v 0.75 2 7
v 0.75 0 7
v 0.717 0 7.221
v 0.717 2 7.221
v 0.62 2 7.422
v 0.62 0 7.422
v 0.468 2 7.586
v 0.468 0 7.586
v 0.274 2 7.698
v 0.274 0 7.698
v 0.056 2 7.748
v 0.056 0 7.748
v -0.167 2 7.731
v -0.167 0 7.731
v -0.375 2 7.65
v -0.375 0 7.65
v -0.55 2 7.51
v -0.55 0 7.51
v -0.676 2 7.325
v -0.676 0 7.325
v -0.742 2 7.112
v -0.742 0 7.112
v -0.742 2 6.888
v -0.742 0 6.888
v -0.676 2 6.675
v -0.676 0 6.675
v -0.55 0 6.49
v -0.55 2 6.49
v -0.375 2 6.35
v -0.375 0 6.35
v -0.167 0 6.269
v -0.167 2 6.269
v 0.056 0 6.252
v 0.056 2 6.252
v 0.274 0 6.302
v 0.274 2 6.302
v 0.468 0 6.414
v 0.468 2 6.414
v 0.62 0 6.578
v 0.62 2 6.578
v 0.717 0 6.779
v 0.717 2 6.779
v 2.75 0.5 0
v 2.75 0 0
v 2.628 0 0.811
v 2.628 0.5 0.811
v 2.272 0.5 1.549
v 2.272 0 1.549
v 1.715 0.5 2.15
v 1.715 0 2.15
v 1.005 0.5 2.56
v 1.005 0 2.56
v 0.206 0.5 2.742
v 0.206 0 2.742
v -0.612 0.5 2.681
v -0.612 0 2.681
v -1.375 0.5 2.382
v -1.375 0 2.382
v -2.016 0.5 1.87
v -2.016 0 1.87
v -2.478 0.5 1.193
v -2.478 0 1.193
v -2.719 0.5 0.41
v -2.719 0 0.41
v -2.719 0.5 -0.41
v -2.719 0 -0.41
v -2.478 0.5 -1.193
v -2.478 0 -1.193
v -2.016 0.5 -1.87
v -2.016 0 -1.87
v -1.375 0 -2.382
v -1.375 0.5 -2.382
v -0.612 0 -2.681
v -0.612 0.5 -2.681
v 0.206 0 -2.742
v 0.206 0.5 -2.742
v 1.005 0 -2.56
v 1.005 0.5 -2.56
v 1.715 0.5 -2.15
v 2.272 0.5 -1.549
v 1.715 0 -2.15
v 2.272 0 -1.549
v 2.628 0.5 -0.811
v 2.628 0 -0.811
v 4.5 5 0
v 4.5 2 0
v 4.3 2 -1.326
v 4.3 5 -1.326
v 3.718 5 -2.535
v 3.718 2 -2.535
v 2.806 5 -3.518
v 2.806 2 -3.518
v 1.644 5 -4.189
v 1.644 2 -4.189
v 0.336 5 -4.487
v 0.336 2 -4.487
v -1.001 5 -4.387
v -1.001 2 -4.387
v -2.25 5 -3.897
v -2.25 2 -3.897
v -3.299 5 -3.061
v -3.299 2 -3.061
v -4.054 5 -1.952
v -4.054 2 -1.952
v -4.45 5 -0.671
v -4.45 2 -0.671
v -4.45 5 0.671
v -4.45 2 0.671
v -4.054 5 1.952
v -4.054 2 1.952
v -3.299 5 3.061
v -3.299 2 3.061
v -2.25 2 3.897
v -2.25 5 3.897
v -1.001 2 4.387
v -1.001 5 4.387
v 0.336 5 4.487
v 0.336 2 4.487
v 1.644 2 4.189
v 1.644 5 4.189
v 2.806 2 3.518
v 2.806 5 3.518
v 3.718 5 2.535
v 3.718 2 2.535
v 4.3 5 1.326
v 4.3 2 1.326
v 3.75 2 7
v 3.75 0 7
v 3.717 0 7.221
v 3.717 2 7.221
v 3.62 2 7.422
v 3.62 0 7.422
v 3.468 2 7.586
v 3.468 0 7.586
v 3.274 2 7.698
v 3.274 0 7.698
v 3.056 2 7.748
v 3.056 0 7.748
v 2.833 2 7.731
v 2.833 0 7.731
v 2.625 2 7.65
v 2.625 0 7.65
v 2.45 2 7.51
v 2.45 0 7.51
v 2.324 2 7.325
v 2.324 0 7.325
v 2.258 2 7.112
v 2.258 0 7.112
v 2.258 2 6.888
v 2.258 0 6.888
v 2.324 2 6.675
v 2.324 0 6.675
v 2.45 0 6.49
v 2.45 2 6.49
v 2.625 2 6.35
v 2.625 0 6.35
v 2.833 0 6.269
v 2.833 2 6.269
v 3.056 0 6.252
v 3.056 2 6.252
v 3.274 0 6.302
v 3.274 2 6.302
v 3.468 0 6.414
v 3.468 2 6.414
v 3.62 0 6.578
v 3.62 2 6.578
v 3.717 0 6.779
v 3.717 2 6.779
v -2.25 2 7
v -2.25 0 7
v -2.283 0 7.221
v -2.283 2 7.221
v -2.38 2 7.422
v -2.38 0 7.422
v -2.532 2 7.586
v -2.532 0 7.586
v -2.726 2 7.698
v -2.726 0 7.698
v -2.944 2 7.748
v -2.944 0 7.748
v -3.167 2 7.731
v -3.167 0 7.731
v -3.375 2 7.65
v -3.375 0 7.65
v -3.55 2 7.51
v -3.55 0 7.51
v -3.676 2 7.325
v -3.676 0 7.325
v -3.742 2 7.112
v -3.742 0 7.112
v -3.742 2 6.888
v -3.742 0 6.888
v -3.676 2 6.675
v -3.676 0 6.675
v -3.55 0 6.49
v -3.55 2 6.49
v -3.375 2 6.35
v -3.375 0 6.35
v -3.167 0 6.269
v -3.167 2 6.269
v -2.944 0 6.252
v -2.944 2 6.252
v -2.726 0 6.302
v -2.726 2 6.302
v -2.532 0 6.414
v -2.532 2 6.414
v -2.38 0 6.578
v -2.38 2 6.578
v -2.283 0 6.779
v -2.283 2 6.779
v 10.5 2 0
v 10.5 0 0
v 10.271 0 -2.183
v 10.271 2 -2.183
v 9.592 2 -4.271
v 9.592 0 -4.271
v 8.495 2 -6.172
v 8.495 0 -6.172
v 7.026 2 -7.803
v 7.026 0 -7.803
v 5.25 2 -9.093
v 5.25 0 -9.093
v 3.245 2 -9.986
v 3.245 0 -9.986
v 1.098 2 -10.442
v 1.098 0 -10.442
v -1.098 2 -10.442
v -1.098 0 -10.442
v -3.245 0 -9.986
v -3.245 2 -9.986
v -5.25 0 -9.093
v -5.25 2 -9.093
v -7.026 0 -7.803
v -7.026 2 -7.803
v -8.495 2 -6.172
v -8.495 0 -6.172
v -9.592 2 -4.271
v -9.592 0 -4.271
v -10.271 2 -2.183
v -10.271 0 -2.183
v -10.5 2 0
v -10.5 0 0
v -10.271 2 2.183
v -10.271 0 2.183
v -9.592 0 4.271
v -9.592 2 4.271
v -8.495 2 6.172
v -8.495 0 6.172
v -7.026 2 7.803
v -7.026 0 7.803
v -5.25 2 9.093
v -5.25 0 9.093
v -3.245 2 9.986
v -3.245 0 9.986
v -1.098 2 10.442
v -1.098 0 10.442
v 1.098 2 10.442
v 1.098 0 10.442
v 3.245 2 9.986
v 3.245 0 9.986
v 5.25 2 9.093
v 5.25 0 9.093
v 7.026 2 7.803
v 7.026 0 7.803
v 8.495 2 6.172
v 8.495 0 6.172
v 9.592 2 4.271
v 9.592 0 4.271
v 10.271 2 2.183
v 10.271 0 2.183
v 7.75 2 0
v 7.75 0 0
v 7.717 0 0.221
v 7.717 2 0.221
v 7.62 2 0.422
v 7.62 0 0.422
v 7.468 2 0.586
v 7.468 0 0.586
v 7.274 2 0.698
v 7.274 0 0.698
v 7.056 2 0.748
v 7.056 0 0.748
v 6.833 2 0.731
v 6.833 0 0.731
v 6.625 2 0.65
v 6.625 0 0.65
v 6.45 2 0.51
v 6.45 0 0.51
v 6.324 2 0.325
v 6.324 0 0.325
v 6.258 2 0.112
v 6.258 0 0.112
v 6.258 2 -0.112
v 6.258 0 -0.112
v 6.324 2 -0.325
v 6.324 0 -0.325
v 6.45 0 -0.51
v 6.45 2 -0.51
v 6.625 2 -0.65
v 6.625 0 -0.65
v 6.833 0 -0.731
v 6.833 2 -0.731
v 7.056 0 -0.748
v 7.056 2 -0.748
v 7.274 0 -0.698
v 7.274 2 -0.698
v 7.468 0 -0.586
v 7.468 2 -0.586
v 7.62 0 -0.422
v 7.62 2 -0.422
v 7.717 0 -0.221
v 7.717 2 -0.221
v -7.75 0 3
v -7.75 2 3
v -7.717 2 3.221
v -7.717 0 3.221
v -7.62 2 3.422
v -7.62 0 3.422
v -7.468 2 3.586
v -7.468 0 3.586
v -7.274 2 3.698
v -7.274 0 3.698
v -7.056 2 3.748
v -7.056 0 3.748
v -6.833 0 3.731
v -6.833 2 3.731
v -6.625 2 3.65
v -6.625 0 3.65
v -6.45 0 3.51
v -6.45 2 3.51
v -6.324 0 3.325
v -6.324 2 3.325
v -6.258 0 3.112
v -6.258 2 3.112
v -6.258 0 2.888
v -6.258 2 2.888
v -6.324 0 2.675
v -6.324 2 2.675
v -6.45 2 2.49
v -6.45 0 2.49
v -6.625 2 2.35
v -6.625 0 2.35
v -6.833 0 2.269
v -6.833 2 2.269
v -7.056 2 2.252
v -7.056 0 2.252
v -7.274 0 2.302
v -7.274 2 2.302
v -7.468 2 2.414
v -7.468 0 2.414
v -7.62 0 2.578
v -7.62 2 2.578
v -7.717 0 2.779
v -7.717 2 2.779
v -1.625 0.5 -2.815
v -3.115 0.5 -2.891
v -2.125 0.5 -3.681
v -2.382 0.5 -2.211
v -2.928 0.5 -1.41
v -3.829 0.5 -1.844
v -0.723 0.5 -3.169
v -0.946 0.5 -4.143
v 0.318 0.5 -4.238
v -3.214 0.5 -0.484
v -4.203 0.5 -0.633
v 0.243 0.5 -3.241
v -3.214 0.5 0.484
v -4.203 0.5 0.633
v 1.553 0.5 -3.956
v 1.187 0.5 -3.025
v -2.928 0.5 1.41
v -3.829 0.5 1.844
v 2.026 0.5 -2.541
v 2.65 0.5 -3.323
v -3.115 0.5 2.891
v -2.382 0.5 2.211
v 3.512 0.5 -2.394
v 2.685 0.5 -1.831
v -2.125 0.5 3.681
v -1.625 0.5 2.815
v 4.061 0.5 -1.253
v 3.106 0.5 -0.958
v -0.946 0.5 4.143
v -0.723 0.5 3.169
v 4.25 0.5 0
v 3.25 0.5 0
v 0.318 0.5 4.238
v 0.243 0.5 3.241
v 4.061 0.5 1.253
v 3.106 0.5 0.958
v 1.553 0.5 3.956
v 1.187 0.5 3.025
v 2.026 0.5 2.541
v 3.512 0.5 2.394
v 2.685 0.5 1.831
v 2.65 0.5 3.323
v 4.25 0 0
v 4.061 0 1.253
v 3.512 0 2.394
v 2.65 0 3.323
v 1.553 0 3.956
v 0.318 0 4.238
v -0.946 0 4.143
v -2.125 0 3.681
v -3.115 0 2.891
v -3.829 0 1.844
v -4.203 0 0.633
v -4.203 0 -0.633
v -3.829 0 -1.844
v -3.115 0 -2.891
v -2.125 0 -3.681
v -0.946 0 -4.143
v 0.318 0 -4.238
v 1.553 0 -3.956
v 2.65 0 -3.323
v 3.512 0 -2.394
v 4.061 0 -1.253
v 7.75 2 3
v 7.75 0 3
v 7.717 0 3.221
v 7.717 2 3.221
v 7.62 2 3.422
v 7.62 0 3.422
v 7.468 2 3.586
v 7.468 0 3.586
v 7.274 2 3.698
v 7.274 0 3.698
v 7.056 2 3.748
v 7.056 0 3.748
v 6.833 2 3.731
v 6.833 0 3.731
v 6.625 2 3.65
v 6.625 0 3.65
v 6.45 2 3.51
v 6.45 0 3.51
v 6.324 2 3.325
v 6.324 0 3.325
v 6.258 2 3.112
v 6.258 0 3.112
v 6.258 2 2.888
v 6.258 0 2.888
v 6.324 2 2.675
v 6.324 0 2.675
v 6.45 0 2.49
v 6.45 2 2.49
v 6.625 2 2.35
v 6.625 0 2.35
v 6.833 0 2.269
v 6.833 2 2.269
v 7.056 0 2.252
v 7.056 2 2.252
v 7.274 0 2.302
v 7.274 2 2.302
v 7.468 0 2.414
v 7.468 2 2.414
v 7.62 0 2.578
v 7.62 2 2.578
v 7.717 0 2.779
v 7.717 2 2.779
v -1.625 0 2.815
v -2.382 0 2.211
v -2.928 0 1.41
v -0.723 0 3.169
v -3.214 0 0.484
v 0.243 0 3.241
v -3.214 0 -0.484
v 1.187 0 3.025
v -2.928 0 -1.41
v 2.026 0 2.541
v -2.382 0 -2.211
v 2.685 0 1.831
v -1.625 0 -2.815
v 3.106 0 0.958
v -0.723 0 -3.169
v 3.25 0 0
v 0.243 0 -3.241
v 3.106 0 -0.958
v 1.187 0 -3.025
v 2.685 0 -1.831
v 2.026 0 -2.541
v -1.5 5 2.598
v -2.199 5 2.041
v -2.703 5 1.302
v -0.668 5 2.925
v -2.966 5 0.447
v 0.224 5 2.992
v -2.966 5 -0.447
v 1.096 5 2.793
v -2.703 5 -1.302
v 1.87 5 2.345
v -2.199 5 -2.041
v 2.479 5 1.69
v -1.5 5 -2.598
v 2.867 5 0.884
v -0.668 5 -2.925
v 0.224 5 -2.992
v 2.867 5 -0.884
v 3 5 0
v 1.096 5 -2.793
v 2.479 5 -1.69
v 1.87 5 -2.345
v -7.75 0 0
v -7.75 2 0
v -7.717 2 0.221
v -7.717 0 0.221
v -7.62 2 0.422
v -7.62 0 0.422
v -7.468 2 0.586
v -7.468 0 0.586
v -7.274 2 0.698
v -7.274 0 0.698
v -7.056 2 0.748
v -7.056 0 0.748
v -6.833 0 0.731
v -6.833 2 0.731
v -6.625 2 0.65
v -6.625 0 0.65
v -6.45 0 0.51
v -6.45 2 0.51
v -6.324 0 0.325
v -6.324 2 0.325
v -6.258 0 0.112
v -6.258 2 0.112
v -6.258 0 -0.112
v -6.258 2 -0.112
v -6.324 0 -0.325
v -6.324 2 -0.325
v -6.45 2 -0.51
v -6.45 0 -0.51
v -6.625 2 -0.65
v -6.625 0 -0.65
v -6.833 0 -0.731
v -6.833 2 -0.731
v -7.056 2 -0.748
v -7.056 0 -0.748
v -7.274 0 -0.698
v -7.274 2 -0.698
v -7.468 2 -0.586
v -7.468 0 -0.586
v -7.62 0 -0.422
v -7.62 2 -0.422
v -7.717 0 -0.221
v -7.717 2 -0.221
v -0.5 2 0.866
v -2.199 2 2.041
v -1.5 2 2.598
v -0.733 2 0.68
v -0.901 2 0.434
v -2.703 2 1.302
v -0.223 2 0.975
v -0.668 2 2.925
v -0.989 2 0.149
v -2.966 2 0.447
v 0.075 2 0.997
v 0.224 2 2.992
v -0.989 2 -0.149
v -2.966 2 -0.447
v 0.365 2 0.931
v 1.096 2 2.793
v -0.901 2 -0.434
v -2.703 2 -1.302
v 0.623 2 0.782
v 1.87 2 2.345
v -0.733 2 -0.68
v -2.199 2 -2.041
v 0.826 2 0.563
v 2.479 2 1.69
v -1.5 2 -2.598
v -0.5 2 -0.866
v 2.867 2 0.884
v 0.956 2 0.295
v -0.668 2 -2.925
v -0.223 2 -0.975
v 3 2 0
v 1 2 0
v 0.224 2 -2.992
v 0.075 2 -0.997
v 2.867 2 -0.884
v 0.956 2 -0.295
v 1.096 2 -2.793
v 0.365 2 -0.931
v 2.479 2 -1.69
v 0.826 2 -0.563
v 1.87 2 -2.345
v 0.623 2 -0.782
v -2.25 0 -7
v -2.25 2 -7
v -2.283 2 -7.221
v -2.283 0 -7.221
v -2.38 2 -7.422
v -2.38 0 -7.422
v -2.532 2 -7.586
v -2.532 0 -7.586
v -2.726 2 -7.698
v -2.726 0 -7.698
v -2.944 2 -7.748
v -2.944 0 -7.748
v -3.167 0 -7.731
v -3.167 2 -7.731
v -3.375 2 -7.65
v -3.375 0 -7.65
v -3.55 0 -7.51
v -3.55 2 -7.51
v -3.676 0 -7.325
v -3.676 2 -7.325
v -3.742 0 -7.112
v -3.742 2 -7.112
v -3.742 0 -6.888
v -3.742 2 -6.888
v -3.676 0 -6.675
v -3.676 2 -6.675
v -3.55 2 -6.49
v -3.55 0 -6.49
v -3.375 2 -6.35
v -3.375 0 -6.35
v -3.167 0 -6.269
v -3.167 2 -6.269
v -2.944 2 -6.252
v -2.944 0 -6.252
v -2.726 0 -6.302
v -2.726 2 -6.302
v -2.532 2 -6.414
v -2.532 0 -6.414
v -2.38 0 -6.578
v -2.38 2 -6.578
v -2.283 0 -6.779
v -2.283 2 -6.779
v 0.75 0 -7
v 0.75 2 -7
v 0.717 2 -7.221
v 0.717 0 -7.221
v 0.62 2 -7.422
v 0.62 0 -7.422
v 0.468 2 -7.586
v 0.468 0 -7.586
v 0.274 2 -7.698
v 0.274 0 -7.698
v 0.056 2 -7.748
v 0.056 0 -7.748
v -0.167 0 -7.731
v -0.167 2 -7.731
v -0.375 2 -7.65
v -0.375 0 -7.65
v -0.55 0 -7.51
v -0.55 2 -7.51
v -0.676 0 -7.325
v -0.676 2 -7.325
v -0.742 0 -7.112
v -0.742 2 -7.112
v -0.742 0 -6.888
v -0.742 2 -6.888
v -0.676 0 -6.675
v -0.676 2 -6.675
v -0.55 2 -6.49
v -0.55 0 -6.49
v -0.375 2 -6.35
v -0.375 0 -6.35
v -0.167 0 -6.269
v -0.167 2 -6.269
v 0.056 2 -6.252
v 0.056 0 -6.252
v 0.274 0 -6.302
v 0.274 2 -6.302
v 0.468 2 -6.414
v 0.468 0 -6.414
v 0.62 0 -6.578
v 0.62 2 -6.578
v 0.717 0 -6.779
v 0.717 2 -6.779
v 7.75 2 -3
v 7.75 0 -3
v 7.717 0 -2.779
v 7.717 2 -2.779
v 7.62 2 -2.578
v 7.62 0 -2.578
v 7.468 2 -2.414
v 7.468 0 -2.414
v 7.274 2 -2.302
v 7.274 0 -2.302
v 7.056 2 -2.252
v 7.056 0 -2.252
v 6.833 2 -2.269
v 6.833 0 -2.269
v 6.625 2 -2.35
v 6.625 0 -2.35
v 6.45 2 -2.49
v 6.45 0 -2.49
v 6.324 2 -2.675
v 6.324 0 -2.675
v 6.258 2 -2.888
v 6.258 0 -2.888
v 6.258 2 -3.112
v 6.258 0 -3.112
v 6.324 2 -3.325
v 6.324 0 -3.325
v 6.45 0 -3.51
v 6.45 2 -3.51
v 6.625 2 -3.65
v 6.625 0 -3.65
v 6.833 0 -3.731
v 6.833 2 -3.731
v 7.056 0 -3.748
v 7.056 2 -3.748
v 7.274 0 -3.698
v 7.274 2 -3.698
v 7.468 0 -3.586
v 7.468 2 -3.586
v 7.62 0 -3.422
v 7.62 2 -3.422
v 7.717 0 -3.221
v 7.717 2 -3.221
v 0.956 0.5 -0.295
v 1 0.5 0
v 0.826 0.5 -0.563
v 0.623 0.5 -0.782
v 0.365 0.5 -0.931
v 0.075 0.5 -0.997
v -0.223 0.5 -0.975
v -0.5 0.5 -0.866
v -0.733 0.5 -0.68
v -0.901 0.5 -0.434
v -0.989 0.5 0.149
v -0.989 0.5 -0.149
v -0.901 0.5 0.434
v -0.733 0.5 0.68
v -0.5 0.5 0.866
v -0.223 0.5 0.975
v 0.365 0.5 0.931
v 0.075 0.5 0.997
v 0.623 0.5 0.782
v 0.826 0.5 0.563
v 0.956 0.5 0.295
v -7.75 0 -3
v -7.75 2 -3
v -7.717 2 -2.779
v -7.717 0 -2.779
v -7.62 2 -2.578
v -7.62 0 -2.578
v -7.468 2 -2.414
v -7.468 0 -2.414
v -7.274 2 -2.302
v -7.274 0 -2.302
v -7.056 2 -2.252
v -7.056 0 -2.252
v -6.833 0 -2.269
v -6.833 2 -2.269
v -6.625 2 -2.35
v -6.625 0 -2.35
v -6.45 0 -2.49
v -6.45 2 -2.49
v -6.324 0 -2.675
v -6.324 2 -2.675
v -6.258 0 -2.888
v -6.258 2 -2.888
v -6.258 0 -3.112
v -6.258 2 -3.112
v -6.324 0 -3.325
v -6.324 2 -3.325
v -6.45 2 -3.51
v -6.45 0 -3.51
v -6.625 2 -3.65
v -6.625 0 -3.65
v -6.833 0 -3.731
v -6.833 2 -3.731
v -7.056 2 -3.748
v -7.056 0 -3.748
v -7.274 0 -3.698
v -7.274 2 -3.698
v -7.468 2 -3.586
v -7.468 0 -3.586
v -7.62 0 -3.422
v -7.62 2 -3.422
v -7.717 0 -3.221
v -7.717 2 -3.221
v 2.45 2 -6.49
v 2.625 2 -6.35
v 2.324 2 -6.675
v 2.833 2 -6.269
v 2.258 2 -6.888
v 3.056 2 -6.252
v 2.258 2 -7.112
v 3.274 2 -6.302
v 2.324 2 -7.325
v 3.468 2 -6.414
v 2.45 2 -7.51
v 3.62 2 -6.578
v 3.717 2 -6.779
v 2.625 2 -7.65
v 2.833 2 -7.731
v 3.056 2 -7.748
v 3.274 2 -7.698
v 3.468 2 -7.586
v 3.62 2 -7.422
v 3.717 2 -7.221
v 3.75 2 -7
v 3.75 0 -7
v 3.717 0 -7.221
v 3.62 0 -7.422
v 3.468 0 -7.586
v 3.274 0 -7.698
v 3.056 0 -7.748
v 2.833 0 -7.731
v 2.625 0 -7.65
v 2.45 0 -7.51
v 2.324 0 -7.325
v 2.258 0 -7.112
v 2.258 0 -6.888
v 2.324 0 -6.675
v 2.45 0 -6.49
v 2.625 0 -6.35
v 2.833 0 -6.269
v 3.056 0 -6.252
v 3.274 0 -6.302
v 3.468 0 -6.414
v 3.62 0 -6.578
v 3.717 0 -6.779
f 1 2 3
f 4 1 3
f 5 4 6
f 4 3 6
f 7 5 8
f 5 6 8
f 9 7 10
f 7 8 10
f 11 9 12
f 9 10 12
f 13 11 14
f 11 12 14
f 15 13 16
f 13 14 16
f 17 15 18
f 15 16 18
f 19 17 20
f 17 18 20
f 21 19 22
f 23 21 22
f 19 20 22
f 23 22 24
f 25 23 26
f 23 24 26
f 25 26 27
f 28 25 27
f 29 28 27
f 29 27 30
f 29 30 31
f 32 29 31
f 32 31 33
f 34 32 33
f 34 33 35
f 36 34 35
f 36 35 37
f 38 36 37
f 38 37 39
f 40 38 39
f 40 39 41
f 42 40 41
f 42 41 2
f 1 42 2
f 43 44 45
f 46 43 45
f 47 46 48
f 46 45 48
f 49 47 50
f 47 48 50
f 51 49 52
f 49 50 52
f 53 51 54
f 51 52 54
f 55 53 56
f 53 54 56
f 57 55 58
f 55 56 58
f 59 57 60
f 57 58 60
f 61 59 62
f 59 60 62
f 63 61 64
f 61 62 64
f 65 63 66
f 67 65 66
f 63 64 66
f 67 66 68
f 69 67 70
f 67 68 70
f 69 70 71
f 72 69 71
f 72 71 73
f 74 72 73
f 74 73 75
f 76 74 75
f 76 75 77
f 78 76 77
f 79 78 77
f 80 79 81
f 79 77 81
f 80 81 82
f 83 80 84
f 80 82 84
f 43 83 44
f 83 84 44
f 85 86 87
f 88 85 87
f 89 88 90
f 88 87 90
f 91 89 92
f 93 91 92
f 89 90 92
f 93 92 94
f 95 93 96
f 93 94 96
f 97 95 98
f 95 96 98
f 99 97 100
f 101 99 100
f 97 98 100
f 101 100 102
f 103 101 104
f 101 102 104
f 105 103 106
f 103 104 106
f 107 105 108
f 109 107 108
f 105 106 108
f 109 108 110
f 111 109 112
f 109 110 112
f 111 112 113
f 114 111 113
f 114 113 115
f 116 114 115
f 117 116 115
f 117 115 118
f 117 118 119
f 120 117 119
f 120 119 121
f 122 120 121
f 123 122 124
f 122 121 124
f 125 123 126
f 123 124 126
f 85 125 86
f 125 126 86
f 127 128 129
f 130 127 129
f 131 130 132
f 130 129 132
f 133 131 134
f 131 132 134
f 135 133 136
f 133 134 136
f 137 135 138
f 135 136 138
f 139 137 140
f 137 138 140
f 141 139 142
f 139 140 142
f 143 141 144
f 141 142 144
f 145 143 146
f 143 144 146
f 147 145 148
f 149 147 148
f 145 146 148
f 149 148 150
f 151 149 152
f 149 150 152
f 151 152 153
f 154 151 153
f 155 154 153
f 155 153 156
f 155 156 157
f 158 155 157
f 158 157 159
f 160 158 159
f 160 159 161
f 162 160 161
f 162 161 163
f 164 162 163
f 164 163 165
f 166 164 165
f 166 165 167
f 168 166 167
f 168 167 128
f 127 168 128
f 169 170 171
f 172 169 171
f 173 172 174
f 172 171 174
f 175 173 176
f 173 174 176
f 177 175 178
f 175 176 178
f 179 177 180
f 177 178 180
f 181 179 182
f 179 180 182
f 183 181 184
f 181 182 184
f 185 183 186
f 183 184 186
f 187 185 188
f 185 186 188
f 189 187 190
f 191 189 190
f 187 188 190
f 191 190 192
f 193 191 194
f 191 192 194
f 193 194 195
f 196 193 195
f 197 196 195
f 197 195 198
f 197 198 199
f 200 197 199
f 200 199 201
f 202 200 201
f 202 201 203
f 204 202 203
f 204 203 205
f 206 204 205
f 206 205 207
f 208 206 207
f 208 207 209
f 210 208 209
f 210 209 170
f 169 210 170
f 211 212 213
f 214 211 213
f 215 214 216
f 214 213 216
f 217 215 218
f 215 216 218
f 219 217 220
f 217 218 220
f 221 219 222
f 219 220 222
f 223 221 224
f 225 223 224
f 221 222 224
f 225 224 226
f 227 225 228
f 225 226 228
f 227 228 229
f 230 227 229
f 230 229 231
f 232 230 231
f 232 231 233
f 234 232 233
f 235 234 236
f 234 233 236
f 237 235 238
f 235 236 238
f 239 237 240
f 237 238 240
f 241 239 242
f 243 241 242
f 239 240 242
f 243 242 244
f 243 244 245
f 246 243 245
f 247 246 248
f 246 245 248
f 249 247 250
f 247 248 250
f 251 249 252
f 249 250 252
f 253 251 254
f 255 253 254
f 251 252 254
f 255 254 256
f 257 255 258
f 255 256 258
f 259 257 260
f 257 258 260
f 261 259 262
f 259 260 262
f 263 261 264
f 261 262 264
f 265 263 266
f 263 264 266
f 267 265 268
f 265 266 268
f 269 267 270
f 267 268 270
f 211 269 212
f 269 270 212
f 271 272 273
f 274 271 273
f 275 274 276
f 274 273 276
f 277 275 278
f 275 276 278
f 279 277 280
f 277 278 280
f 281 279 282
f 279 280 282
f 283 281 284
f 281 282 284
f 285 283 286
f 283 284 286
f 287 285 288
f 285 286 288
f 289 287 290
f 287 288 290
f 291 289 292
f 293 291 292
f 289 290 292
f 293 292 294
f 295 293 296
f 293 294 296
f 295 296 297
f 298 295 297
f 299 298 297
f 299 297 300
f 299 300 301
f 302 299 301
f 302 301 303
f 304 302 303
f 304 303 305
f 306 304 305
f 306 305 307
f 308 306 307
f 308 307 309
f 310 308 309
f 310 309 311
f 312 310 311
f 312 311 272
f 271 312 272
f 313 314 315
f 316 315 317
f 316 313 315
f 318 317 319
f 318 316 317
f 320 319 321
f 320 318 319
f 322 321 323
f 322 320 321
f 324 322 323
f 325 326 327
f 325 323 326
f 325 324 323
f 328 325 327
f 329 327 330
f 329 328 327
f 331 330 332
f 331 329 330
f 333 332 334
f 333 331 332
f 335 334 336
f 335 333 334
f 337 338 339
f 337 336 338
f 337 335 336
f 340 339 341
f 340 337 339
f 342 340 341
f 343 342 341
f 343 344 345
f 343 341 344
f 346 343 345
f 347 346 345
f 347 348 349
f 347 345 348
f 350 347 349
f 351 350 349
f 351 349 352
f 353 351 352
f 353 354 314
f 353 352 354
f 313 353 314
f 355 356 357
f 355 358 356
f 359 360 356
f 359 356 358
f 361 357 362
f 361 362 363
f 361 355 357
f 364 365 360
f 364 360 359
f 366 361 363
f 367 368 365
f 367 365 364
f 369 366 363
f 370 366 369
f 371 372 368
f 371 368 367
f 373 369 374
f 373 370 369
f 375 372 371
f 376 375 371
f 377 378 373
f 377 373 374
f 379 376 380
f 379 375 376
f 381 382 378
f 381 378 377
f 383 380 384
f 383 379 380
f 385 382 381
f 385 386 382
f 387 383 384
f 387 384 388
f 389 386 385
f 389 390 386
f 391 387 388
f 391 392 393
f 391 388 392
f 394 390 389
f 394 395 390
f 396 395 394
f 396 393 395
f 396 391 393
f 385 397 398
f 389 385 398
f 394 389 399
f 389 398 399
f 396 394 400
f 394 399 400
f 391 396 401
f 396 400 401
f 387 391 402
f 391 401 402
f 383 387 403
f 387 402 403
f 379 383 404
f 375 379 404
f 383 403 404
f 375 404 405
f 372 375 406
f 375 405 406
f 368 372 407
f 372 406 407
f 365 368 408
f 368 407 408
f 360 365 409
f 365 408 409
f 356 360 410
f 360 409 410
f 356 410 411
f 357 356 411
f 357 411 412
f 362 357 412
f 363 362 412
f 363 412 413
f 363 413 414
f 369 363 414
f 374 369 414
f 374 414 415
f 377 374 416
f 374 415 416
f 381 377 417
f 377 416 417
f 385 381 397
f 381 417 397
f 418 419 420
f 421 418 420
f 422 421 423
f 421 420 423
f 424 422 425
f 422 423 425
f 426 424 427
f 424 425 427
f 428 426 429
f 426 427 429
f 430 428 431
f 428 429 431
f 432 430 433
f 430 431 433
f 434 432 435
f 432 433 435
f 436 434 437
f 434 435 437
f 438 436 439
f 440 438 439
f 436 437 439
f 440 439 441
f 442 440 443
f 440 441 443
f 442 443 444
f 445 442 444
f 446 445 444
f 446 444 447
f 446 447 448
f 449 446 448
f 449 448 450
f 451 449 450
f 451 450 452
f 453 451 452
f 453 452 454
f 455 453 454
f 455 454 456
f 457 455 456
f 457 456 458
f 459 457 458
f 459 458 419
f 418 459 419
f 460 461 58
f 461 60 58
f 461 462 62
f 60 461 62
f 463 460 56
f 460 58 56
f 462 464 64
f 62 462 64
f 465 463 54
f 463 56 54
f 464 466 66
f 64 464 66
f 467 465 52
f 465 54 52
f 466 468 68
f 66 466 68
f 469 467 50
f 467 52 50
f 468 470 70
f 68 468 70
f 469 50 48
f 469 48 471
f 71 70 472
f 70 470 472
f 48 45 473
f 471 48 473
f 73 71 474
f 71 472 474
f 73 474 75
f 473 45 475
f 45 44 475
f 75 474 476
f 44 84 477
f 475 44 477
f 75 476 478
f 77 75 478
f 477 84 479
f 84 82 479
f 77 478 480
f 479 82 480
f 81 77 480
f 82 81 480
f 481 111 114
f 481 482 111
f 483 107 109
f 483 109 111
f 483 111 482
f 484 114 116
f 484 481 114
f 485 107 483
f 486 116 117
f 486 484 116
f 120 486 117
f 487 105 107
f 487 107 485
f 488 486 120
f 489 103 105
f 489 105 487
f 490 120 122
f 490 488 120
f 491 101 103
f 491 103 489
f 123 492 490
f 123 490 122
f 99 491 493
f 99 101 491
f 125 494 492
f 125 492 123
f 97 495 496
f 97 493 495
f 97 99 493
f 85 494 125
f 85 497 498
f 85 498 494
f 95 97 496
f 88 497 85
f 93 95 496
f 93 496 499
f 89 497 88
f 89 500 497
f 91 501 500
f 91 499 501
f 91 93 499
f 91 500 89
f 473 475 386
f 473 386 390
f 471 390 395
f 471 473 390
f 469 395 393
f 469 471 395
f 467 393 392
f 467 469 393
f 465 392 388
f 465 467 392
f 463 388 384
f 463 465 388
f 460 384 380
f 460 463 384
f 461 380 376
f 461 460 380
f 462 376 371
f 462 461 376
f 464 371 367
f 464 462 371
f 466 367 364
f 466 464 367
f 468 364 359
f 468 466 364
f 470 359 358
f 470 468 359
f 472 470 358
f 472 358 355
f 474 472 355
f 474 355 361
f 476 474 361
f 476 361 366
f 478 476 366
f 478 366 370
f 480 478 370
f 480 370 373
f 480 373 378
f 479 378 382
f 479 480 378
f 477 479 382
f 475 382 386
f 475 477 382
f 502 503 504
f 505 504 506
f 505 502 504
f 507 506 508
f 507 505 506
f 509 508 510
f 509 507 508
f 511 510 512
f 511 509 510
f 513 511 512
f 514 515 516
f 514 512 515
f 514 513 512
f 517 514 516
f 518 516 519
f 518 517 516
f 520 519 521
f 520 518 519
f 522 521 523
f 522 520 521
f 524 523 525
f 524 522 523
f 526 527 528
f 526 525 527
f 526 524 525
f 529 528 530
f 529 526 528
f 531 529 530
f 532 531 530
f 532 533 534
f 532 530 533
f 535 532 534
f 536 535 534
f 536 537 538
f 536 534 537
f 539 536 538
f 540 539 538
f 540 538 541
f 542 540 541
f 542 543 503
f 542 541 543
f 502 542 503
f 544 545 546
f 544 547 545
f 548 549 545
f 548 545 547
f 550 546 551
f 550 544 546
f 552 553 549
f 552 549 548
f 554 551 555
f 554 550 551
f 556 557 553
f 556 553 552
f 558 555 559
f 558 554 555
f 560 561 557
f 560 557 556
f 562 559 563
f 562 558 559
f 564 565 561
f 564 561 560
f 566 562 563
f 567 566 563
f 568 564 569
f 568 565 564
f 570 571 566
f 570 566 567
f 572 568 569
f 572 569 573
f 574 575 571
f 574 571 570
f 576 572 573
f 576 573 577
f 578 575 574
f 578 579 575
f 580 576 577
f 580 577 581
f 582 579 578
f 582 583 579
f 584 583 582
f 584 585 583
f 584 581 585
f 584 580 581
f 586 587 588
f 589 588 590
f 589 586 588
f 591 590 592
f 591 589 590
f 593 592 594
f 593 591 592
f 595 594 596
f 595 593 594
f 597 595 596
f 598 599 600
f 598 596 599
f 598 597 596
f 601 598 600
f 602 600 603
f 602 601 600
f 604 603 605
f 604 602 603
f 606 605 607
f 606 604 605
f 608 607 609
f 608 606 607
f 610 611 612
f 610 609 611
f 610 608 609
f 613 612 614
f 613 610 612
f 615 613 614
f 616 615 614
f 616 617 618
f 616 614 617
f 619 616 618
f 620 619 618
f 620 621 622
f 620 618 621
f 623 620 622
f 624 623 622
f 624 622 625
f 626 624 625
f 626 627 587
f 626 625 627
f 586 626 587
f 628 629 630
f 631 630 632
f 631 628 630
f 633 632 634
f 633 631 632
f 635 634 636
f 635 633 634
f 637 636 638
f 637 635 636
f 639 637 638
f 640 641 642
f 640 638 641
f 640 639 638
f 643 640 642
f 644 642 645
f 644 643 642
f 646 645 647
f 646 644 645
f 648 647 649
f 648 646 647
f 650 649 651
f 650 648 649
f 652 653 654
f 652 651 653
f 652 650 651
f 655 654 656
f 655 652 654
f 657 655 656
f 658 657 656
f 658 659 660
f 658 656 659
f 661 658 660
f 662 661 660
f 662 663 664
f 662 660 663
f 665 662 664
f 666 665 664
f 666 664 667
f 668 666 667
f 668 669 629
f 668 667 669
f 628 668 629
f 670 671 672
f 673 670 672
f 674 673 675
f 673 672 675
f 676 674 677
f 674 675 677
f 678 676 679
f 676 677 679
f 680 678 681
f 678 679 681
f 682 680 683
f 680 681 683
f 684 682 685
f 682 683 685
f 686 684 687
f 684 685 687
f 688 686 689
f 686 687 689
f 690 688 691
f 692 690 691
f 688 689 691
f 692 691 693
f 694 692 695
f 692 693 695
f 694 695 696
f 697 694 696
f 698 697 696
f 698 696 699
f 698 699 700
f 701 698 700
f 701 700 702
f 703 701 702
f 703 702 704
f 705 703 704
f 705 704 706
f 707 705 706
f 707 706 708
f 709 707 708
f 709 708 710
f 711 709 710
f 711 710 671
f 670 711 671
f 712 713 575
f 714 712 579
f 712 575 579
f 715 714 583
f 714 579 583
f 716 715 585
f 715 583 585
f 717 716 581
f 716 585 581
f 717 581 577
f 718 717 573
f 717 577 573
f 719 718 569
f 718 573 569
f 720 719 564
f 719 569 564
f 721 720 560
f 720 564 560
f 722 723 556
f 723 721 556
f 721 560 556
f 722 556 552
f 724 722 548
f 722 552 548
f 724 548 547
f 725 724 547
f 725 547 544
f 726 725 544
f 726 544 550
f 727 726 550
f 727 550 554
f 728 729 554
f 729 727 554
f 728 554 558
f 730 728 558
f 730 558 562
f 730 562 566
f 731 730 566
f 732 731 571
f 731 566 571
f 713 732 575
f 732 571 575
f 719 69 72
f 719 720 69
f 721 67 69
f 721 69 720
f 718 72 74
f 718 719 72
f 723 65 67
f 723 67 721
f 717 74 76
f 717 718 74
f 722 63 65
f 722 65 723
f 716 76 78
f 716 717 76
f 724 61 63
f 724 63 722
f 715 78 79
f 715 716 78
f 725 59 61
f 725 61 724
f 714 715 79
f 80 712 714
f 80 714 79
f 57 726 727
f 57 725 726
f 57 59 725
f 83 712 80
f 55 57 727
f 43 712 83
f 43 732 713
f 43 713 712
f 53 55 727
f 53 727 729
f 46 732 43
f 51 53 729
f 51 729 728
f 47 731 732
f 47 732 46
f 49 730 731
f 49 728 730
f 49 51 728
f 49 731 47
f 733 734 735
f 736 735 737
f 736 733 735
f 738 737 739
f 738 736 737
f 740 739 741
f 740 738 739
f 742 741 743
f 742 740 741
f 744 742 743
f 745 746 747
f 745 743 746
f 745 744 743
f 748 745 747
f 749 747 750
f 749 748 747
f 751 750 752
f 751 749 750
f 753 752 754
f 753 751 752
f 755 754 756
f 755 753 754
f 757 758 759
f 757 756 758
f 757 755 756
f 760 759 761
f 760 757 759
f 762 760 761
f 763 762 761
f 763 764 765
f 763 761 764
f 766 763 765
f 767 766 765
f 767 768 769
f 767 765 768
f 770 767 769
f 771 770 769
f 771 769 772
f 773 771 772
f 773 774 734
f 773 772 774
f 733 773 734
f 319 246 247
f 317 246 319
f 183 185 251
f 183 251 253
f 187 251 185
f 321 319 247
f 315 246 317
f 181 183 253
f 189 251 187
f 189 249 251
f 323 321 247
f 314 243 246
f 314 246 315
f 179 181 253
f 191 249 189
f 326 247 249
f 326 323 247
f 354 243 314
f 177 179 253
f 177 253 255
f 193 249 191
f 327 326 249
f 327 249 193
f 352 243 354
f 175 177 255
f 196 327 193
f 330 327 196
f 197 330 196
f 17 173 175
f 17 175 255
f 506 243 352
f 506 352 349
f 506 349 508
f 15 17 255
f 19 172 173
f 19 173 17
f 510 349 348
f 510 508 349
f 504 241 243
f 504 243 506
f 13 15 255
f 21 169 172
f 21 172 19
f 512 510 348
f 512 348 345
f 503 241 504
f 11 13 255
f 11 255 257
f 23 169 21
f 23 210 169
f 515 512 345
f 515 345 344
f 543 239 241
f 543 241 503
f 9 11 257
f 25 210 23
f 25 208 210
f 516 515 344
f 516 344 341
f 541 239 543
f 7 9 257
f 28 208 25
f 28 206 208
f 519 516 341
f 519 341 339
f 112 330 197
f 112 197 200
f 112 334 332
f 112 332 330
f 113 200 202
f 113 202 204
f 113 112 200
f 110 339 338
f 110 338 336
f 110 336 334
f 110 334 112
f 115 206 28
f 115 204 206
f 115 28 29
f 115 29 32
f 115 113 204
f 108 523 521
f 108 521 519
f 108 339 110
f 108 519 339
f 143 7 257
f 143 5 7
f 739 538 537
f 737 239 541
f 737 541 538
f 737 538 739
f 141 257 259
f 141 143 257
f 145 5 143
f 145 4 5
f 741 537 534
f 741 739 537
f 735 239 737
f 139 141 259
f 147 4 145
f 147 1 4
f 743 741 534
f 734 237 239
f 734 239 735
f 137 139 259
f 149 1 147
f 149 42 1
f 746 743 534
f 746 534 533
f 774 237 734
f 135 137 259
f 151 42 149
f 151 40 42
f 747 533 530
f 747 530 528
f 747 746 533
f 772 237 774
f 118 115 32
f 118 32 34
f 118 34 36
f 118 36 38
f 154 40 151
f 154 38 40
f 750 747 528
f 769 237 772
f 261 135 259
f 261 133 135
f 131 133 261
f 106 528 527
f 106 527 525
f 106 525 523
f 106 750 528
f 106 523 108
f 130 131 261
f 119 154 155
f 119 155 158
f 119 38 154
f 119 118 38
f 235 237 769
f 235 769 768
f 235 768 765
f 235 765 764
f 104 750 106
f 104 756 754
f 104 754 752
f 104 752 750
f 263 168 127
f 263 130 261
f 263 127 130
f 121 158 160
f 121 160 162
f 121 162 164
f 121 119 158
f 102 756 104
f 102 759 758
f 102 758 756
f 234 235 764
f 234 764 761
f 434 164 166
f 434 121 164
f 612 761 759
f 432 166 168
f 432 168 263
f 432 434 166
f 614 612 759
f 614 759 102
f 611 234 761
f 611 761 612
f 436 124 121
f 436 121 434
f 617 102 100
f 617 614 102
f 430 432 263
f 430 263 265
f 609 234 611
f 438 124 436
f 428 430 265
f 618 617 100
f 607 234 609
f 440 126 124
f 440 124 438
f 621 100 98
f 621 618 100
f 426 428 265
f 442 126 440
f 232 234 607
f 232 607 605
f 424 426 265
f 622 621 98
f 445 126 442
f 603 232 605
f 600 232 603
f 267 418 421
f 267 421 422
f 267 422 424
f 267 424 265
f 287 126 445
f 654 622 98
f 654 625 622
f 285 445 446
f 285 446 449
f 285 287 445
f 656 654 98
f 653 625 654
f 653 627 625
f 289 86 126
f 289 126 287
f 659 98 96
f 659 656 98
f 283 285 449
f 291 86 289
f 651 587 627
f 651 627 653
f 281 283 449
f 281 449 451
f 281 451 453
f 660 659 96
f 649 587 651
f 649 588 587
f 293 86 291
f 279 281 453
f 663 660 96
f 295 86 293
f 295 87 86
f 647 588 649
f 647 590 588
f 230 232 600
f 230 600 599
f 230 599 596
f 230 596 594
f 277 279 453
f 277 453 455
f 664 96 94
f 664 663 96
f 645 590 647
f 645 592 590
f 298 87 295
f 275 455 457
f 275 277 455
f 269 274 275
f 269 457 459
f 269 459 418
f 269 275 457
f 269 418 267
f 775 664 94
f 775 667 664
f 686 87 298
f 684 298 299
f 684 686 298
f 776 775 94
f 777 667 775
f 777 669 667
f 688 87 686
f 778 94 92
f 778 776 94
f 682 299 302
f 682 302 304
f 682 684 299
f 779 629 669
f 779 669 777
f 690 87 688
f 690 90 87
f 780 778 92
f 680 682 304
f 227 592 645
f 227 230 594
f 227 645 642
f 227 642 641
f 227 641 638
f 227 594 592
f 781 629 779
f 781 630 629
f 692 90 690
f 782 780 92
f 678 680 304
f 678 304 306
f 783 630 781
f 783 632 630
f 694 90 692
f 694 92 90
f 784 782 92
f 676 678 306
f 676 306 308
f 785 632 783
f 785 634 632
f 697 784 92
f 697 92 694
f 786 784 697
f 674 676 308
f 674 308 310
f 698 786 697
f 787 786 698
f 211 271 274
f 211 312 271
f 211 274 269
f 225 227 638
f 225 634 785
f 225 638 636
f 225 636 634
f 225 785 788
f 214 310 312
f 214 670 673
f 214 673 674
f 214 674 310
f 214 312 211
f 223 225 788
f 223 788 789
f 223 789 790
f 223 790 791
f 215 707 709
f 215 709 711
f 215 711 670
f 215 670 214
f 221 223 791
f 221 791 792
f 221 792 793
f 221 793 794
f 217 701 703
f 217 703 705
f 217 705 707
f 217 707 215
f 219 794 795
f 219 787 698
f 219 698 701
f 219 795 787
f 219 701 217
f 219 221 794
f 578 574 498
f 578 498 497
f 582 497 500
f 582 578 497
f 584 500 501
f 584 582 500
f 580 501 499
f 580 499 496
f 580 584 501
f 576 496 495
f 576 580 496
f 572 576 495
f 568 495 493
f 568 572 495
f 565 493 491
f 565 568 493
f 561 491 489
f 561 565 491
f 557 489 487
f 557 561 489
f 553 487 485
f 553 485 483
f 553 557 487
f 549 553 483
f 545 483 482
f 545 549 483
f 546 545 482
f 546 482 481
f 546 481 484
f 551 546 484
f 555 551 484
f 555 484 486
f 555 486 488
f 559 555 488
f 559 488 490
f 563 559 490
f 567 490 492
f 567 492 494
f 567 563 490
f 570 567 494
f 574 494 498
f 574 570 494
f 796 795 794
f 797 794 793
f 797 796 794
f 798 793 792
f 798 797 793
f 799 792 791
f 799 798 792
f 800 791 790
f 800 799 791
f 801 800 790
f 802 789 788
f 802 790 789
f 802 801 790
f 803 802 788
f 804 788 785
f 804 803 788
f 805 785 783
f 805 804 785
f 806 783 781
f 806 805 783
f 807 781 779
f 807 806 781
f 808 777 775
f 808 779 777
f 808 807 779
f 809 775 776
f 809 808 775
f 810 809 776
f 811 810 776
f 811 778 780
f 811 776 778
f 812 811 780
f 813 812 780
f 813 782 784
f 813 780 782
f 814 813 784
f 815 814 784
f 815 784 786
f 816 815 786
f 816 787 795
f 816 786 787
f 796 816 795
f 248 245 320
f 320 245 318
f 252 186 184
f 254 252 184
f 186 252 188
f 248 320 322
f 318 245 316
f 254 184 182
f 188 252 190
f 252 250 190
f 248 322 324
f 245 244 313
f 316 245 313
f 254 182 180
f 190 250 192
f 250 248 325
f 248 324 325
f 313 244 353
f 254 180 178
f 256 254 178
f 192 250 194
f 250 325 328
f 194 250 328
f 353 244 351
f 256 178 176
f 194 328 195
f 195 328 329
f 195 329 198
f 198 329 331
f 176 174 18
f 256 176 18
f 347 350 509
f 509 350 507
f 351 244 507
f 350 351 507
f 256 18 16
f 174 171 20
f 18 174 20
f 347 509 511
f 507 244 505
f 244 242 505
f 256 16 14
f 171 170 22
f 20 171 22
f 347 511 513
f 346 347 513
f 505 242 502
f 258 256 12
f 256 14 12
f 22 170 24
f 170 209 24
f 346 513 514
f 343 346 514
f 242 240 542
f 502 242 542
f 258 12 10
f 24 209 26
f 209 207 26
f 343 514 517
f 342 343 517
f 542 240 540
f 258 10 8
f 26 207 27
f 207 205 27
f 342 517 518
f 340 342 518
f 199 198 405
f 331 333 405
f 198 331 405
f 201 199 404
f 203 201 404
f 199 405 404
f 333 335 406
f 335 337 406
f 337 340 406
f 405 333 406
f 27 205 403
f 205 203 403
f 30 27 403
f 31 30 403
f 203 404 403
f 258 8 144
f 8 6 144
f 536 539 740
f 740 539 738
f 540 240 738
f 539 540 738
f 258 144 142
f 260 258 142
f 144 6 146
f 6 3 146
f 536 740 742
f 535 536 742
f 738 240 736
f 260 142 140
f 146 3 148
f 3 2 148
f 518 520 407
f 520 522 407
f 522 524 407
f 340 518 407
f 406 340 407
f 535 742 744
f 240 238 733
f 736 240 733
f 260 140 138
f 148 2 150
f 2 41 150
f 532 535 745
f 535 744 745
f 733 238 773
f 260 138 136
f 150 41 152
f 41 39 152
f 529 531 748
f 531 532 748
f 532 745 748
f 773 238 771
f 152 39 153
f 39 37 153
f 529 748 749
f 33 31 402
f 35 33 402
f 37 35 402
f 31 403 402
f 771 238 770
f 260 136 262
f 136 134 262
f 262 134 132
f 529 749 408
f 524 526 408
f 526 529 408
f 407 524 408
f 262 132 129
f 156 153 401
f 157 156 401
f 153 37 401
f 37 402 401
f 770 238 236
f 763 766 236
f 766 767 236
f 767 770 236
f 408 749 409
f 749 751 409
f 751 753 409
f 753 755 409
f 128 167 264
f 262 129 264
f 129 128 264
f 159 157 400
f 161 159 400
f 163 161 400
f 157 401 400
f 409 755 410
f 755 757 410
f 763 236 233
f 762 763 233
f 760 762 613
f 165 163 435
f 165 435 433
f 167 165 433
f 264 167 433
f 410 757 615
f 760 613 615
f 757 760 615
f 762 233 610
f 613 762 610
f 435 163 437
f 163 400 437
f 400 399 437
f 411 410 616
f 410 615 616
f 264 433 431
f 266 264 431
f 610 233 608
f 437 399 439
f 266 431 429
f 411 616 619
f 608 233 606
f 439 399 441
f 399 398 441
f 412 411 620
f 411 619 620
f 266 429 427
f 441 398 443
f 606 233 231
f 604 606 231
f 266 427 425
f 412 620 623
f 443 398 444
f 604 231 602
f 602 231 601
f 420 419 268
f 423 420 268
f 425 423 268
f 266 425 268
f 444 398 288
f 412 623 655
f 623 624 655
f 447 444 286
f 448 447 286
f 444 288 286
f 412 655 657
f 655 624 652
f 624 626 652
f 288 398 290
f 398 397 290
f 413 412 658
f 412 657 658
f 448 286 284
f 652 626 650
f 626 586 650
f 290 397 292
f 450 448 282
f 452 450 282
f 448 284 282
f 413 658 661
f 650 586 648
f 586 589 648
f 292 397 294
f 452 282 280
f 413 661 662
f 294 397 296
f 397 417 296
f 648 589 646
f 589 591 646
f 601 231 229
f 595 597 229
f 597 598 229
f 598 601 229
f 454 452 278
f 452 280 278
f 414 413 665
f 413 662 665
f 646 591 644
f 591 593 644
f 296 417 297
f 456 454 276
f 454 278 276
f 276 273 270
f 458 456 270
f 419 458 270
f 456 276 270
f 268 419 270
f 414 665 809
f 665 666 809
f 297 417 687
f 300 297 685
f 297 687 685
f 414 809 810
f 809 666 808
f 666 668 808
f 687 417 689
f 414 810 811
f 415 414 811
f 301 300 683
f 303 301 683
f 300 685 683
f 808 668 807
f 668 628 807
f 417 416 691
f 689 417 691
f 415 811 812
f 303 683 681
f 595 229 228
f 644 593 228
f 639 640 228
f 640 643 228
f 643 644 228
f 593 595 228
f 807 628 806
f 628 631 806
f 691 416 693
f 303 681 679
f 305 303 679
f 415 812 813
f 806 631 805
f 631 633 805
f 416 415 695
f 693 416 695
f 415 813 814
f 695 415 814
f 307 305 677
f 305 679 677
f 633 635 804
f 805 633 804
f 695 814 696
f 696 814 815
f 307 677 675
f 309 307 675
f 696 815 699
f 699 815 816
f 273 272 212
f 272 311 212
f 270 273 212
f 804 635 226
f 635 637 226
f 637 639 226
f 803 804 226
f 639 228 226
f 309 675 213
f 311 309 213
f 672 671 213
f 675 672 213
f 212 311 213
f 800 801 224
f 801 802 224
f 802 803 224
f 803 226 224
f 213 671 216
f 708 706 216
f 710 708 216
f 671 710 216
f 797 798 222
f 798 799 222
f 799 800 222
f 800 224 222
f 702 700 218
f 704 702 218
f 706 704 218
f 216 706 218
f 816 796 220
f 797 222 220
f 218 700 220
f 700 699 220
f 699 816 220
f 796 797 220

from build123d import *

# Parameters (mm, degrees)
SKETCH1_R           = 10.5
BOSS_EXTRUDE1_DEPTH = 2
SKETCH2_R           = 4.5
SKETCH2_R_2         = 3
BOSS_EXTRUDE2_DEPTH = 3
SKETCH3_R           = 1
CUT_EXTRUDE1_DEPTH  = 3
SKETCH4_R           = 4.25
SKETCH4_R_2         = 3.25
SKETCH4_R_3         = 2.75
SKETCH4_R_4         = 1
CUT_EXTRUDE2_DEPTH  = 0.5
SKETCH5_R           = 0.75
CUT_EXTRUDE3_DEPTH  = 2.5
SKETCH7_R           = 0.75
CUT_EXTRUDE4_DEPTH  = 2.5


with BuildPart() as part:
    # Sketch1 → Boss-Extrude1 (new body)
    with BuildSketch(Plane(origin=(0, 0, 0), x_dir=(1, 0, 0), z_dir=(0, 1, 0))):
        Circle(SKETCH1_R)
    extrude(amount=BOSS_EXTRUDE1_DEPTH)

    # Sketch2 → Boss-Extrude2 (add)
    with BuildSketch(Plane(origin=(0, 2, 0), x_dir=(1, 0, 0), z_dir=(0, 1, 0))):
        Circle(SKETCH2_R)
        Circle(SKETCH2_R_2, mode=Mode.SUBTRACT)
    extrude(amount=BOSS_EXTRUDE2_DEPTH)

    # Sketch3 → Cut-Extrude1 (cut)
    with BuildSketch(Plane(origin=(0, 2, 0), x_dir=(1, 0, 0), z_dir=(0, 1, 0))):
        Circle(SKETCH3_R)
    extrude(amount=-CUT_EXTRUDE1_DEPTH, mode=Mode.SUBTRACT)

    # Sketch4 → Cut-Extrude2 (cut)
    with BuildSketch(Plane.XZ):
        Circle(SKETCH4_R)
        Circle(SKETCH4_R_2, mode=Mode.SUBTRACT)
        Circle(SKETCH4_R_3)
        Circle(SKETCH4_R_4, mode=Mode.SUBTRACT)
    extrude(amount=-CUT_EXTRUDE2_DEPTH, mode=Mode.SUBTRACT)

    # Sketch5 → Cut-Extrude3 (cut)
    with BuildSketch(Plane.XZ):
        with Locations((0, 7)):
            Circle(SKETCH5_R)
        with Locations((3, 7)):
            Circle(SKETCH5_R)
        with Locations((-3, 7)):
            Circle(SKETCH5_R)
    cut_extrude3 = extrude(amount=-CUT_EXTRUDE3_DEPTH, mode=Mode.SUBTRACT)

    # Mirror1: Cut-Extrude3 across plane
    add(cut_extrude3.mirror(Plane.XY), mode=Mode.SUBTRACT)

    # Sketch7 → Cut-Extrude4 (cut)
    with BuildSketch(Plane.XZ):
        with Locations((7, 0)):
            Circle(SKETCH7_R)
        with Locations((7, 3)):
            Circle(SKETCH7_R)
        with Locations((7, -3)):
            Circle(SKETCH7_R)
    cut_extrude4 = extrude(amount=-CUT_EXTRUDE4_DEPTH, mode=Mode.SUBTRACT)

    # Mirror2: Cut-Extrude4 across plane
    add(cut_extrude4.mirror(Plane(origin=(0, 0, 0), x_dir=(0, 0, 1), z_dir=(1, 0, 0))), mode=Mode.SUBTRACT)


solid = part.part
